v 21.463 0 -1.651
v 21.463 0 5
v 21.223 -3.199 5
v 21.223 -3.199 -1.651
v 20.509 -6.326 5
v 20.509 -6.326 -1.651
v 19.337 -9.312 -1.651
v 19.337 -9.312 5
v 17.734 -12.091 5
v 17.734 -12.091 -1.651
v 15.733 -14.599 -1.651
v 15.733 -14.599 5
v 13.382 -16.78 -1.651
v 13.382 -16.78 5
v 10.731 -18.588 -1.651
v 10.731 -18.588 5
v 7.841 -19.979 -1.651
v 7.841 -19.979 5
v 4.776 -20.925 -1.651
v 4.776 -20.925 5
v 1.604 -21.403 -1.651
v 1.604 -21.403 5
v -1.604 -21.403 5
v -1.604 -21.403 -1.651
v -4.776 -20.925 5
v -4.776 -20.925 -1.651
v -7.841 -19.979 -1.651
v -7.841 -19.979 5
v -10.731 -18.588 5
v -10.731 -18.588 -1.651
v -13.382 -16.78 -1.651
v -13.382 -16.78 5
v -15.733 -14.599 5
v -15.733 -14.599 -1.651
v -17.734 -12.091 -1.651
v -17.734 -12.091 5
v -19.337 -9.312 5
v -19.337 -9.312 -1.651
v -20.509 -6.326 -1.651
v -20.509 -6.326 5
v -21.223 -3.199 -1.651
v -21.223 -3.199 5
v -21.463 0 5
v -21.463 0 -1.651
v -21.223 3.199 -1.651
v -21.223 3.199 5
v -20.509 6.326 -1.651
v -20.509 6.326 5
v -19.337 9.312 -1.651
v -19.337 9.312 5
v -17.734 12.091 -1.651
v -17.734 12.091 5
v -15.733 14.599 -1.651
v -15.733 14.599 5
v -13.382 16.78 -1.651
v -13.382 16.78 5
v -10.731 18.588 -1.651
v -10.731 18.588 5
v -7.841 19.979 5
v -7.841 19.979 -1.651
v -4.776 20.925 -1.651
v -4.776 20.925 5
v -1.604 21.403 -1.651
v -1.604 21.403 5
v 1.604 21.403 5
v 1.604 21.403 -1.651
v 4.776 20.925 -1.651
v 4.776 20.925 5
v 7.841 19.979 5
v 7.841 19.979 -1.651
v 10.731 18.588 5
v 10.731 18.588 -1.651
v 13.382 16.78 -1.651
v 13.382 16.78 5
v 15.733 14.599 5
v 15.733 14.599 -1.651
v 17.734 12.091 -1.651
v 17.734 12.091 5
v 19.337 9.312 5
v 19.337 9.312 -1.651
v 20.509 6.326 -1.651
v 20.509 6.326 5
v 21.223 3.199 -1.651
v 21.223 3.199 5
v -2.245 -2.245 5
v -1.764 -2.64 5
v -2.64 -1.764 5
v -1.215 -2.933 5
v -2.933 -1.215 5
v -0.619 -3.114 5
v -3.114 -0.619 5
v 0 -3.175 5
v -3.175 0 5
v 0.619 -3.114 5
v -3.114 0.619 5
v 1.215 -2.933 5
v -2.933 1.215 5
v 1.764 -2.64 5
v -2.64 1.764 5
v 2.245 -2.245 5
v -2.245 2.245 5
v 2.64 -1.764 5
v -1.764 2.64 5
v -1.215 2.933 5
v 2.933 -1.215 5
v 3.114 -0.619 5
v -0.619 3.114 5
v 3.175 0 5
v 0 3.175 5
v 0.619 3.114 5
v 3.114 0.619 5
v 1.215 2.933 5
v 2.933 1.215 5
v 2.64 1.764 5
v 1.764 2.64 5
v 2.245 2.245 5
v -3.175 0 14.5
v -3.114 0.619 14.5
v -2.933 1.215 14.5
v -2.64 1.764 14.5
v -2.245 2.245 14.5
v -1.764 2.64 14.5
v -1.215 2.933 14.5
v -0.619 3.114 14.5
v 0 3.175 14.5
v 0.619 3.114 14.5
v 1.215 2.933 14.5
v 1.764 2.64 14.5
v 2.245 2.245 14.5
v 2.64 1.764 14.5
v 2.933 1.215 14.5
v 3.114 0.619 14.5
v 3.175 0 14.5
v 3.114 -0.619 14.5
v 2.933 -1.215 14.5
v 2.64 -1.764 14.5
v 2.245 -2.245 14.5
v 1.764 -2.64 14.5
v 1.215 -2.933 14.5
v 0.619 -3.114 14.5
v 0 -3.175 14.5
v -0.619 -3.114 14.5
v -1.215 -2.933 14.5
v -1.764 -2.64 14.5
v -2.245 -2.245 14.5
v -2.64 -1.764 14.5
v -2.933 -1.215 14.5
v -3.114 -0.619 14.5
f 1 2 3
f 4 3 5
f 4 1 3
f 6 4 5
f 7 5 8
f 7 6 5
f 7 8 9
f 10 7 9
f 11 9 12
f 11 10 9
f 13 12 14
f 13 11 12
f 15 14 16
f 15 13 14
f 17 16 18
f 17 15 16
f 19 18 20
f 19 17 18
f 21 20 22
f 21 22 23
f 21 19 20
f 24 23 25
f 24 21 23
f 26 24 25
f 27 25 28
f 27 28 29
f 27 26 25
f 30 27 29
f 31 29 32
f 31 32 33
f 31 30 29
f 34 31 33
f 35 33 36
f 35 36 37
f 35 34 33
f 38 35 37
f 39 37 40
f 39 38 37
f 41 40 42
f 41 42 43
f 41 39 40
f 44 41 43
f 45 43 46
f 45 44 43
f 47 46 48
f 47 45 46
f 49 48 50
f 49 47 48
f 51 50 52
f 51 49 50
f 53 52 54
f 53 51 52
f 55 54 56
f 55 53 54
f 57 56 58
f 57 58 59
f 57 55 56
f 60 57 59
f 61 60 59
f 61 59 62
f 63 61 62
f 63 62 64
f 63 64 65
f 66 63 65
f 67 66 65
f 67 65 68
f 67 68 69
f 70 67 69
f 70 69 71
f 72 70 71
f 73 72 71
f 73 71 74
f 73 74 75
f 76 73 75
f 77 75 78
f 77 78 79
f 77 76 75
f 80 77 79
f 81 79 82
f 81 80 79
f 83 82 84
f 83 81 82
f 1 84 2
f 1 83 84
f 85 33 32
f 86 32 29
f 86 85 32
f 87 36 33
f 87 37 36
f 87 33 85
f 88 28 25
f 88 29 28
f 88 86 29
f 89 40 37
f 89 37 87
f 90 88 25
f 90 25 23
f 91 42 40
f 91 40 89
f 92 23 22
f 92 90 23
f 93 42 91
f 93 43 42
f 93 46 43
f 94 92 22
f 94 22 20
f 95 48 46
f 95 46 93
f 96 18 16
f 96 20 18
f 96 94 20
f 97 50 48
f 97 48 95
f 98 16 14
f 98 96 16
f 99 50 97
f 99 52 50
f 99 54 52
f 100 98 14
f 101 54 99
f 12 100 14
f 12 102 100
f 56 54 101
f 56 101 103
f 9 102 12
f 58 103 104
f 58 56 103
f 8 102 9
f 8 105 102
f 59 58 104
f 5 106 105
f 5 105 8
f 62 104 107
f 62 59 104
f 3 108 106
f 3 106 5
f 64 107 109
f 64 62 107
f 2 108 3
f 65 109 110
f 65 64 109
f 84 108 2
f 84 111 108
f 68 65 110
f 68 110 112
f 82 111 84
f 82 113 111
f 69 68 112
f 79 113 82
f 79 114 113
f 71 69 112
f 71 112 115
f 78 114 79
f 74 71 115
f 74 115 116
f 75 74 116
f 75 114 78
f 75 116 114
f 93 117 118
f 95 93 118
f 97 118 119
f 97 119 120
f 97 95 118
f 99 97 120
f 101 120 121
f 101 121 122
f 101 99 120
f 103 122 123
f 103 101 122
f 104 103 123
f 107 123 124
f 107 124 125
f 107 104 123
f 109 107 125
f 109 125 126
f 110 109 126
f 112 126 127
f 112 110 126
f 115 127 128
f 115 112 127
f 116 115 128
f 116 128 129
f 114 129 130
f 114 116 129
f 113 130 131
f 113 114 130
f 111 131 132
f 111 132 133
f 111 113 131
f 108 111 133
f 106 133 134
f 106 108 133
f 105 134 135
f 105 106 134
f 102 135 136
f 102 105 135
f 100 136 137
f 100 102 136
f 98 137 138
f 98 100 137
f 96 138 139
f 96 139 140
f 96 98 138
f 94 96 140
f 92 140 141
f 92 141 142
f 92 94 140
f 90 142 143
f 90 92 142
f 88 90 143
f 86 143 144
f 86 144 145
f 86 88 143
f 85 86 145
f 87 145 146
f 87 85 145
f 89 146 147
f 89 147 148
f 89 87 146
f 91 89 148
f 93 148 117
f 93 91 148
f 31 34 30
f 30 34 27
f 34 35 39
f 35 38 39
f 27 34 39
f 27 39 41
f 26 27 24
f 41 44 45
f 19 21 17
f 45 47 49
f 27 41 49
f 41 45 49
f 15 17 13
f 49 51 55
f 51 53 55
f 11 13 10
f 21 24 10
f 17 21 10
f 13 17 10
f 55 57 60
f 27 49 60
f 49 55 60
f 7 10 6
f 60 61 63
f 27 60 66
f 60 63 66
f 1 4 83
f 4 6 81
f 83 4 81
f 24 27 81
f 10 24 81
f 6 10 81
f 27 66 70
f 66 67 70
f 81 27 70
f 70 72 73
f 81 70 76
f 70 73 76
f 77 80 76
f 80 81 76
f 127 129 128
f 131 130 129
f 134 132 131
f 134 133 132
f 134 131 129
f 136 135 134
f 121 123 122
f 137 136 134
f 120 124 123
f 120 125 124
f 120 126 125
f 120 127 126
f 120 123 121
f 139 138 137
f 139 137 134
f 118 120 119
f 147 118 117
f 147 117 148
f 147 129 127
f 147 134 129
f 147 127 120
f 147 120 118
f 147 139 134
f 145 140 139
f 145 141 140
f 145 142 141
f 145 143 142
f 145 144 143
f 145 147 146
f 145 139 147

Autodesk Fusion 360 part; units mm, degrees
sketch "Sketch1" plane through (0, 0, 0) normal (0, 0, 1) x (1, 0, 0)
  circle A0 centre (0, 0) radius 21.463
  dimension "d1" = 42.926
extrude "Extrude1" add sketch "Sketch1" along normal blind 5
sketch "Sketch2" plane through (0, 0, 5) normal (0, 0, 1) x (-1, 0, 0)
  circle A0 centre (0, 0) radius 21.463
  circle A1 centre (0, 0) radius 3.175
  dimension "d4" = 6.35
extrude "Extrude2" add sketch "Sketch2" along normal blind 9.4996 contours A1
thread "Thread1" thread offset 0 thread length 10.0076
move_face "OffsetFaces1" offset 1.651 1 faces at (1.0387, 4.551, 0)
equation "d5 = -0.385 in + 0.709 in + 0.05 in"
equation "d9 = 0.262 in - 0.197 in"
